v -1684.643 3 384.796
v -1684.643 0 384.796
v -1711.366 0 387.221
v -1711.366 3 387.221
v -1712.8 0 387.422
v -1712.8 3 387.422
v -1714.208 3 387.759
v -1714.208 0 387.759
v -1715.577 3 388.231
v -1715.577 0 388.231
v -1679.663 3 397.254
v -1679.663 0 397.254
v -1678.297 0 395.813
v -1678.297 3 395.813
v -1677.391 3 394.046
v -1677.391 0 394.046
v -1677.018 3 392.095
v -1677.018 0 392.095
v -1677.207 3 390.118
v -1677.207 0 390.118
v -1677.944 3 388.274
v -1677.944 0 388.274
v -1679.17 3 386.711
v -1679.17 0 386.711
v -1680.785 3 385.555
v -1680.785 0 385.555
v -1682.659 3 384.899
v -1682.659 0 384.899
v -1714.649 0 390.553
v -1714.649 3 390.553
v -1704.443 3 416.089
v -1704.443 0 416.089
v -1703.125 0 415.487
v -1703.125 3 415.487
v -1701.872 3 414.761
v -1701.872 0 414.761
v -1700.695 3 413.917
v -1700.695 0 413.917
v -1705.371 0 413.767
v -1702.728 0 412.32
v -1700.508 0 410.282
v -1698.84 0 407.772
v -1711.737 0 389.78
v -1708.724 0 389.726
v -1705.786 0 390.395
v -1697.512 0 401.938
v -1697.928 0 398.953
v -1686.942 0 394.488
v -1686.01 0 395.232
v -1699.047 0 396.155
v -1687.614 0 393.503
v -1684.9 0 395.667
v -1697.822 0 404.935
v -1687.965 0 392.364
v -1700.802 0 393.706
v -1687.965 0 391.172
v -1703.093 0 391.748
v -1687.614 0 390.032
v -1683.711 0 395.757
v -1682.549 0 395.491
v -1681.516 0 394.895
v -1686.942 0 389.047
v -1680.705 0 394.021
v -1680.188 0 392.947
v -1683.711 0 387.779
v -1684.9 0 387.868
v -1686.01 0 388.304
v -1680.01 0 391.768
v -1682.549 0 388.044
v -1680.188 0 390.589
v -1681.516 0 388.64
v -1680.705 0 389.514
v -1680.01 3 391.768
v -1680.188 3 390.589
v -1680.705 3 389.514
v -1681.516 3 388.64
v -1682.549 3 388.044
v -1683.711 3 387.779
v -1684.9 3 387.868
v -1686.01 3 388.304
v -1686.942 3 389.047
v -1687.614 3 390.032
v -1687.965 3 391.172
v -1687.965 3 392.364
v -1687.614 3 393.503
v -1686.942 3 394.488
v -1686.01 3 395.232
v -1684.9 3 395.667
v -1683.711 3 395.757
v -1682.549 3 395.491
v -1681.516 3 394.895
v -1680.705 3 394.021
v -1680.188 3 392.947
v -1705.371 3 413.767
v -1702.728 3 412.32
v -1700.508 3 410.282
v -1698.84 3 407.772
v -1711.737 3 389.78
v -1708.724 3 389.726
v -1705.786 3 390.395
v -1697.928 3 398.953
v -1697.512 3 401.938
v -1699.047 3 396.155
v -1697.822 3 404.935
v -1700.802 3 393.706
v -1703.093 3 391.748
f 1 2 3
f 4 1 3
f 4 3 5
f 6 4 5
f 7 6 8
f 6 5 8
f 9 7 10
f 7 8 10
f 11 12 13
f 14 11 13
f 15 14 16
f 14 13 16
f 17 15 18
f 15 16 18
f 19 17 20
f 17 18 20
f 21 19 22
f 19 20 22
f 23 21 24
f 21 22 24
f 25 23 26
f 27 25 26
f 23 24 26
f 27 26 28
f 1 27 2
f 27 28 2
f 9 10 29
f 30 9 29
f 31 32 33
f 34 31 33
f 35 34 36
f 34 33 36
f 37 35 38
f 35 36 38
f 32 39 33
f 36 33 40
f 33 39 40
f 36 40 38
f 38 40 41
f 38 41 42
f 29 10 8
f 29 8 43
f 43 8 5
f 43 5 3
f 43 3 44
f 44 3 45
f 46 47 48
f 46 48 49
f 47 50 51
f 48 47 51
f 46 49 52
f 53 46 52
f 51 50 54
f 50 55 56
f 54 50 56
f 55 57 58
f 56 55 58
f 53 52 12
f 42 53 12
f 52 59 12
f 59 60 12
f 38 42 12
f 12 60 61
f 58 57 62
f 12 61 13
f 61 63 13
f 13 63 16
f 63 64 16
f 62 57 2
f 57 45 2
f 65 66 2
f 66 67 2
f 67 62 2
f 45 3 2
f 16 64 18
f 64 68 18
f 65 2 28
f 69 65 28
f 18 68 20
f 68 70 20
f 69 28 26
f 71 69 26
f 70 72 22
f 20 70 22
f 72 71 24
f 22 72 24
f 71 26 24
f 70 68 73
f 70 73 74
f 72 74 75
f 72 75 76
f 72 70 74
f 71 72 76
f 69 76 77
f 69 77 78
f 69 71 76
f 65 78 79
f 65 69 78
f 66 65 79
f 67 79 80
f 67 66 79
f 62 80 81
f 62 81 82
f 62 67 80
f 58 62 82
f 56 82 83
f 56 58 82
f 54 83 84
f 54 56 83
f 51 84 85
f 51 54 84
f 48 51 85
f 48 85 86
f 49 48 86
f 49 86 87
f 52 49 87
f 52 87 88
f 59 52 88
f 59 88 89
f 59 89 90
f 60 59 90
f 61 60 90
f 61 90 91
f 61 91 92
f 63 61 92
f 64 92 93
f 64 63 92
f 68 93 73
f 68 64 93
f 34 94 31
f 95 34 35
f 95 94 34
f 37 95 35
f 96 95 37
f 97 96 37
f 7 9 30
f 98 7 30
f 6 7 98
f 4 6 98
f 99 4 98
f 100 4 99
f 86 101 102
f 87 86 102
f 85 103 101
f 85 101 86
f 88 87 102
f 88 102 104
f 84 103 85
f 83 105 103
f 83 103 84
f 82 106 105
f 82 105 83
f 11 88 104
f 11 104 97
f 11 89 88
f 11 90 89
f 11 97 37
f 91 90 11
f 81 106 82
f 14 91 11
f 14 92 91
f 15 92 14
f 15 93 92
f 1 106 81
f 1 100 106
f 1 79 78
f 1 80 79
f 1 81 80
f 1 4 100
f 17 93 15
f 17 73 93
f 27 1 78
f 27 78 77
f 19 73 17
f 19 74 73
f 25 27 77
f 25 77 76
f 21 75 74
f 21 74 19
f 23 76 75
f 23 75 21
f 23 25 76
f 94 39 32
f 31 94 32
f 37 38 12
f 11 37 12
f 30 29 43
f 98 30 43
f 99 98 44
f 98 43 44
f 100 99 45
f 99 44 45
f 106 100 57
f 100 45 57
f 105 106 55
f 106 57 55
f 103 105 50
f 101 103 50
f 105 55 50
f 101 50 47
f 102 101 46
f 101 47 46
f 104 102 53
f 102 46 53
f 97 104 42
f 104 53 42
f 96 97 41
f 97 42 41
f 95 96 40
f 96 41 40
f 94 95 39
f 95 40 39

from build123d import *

# Parameters (mm, degrees)
SZKIC1_R                    = 4
DODANIE_WYCI_GNI_CIE1_DEPTH = 3


with BuildPart() as part:
    # Szkic1 → Dodanie-wyciągnięcie1 (new body)
    with BuildSketch(Plane(origin=(0, 0, 0), x_dir=(1, 0, 0), z_dir=(0, 1, 0))):
        with BuildLine():
            Line((-1700.695176003, -413.9172979), (-1679.663082135, -397.254434174))
            ThreePointArc((-1679.663082135, -397.254434174), (-1677.51, -389.169618943), (-1684.642632151, -384.796341157))
            Line((-1684.642632151, -384.796341157), (-1711.365640324, -387.221384291))
            ThreePointArc((-1711.365640324, -387.221384291), (-1713.508120123, -387.573596893), (-1715.577306167, -388.231428571))
            Line((-1715.577306167, -388.231428571), (-1714.649421806, -390.552857143))
            ThreePointArc((-1714.649421806, -390.552857143), (-1698.402857143, -397.520578194), (-1705.370578194, -413.767142857))
            Line((-1705.370578194, -413.767142857), (-1704.442693833, -416.088571429))
            ThreePointArc((-1704.442693833, -416.088571429), (-1702.490155803, -415.138903777), (-1700.695176003, -413.9172979))
        make_face()
        with Locations((-1684.01, -391.767695155)):
            Circle(SZKIC1_R, mode=Mode.SUBTRACT)
    extrude(amount=DODANIE_WYCI_GNI_CIE1_DEPTH)


solid = part.part
